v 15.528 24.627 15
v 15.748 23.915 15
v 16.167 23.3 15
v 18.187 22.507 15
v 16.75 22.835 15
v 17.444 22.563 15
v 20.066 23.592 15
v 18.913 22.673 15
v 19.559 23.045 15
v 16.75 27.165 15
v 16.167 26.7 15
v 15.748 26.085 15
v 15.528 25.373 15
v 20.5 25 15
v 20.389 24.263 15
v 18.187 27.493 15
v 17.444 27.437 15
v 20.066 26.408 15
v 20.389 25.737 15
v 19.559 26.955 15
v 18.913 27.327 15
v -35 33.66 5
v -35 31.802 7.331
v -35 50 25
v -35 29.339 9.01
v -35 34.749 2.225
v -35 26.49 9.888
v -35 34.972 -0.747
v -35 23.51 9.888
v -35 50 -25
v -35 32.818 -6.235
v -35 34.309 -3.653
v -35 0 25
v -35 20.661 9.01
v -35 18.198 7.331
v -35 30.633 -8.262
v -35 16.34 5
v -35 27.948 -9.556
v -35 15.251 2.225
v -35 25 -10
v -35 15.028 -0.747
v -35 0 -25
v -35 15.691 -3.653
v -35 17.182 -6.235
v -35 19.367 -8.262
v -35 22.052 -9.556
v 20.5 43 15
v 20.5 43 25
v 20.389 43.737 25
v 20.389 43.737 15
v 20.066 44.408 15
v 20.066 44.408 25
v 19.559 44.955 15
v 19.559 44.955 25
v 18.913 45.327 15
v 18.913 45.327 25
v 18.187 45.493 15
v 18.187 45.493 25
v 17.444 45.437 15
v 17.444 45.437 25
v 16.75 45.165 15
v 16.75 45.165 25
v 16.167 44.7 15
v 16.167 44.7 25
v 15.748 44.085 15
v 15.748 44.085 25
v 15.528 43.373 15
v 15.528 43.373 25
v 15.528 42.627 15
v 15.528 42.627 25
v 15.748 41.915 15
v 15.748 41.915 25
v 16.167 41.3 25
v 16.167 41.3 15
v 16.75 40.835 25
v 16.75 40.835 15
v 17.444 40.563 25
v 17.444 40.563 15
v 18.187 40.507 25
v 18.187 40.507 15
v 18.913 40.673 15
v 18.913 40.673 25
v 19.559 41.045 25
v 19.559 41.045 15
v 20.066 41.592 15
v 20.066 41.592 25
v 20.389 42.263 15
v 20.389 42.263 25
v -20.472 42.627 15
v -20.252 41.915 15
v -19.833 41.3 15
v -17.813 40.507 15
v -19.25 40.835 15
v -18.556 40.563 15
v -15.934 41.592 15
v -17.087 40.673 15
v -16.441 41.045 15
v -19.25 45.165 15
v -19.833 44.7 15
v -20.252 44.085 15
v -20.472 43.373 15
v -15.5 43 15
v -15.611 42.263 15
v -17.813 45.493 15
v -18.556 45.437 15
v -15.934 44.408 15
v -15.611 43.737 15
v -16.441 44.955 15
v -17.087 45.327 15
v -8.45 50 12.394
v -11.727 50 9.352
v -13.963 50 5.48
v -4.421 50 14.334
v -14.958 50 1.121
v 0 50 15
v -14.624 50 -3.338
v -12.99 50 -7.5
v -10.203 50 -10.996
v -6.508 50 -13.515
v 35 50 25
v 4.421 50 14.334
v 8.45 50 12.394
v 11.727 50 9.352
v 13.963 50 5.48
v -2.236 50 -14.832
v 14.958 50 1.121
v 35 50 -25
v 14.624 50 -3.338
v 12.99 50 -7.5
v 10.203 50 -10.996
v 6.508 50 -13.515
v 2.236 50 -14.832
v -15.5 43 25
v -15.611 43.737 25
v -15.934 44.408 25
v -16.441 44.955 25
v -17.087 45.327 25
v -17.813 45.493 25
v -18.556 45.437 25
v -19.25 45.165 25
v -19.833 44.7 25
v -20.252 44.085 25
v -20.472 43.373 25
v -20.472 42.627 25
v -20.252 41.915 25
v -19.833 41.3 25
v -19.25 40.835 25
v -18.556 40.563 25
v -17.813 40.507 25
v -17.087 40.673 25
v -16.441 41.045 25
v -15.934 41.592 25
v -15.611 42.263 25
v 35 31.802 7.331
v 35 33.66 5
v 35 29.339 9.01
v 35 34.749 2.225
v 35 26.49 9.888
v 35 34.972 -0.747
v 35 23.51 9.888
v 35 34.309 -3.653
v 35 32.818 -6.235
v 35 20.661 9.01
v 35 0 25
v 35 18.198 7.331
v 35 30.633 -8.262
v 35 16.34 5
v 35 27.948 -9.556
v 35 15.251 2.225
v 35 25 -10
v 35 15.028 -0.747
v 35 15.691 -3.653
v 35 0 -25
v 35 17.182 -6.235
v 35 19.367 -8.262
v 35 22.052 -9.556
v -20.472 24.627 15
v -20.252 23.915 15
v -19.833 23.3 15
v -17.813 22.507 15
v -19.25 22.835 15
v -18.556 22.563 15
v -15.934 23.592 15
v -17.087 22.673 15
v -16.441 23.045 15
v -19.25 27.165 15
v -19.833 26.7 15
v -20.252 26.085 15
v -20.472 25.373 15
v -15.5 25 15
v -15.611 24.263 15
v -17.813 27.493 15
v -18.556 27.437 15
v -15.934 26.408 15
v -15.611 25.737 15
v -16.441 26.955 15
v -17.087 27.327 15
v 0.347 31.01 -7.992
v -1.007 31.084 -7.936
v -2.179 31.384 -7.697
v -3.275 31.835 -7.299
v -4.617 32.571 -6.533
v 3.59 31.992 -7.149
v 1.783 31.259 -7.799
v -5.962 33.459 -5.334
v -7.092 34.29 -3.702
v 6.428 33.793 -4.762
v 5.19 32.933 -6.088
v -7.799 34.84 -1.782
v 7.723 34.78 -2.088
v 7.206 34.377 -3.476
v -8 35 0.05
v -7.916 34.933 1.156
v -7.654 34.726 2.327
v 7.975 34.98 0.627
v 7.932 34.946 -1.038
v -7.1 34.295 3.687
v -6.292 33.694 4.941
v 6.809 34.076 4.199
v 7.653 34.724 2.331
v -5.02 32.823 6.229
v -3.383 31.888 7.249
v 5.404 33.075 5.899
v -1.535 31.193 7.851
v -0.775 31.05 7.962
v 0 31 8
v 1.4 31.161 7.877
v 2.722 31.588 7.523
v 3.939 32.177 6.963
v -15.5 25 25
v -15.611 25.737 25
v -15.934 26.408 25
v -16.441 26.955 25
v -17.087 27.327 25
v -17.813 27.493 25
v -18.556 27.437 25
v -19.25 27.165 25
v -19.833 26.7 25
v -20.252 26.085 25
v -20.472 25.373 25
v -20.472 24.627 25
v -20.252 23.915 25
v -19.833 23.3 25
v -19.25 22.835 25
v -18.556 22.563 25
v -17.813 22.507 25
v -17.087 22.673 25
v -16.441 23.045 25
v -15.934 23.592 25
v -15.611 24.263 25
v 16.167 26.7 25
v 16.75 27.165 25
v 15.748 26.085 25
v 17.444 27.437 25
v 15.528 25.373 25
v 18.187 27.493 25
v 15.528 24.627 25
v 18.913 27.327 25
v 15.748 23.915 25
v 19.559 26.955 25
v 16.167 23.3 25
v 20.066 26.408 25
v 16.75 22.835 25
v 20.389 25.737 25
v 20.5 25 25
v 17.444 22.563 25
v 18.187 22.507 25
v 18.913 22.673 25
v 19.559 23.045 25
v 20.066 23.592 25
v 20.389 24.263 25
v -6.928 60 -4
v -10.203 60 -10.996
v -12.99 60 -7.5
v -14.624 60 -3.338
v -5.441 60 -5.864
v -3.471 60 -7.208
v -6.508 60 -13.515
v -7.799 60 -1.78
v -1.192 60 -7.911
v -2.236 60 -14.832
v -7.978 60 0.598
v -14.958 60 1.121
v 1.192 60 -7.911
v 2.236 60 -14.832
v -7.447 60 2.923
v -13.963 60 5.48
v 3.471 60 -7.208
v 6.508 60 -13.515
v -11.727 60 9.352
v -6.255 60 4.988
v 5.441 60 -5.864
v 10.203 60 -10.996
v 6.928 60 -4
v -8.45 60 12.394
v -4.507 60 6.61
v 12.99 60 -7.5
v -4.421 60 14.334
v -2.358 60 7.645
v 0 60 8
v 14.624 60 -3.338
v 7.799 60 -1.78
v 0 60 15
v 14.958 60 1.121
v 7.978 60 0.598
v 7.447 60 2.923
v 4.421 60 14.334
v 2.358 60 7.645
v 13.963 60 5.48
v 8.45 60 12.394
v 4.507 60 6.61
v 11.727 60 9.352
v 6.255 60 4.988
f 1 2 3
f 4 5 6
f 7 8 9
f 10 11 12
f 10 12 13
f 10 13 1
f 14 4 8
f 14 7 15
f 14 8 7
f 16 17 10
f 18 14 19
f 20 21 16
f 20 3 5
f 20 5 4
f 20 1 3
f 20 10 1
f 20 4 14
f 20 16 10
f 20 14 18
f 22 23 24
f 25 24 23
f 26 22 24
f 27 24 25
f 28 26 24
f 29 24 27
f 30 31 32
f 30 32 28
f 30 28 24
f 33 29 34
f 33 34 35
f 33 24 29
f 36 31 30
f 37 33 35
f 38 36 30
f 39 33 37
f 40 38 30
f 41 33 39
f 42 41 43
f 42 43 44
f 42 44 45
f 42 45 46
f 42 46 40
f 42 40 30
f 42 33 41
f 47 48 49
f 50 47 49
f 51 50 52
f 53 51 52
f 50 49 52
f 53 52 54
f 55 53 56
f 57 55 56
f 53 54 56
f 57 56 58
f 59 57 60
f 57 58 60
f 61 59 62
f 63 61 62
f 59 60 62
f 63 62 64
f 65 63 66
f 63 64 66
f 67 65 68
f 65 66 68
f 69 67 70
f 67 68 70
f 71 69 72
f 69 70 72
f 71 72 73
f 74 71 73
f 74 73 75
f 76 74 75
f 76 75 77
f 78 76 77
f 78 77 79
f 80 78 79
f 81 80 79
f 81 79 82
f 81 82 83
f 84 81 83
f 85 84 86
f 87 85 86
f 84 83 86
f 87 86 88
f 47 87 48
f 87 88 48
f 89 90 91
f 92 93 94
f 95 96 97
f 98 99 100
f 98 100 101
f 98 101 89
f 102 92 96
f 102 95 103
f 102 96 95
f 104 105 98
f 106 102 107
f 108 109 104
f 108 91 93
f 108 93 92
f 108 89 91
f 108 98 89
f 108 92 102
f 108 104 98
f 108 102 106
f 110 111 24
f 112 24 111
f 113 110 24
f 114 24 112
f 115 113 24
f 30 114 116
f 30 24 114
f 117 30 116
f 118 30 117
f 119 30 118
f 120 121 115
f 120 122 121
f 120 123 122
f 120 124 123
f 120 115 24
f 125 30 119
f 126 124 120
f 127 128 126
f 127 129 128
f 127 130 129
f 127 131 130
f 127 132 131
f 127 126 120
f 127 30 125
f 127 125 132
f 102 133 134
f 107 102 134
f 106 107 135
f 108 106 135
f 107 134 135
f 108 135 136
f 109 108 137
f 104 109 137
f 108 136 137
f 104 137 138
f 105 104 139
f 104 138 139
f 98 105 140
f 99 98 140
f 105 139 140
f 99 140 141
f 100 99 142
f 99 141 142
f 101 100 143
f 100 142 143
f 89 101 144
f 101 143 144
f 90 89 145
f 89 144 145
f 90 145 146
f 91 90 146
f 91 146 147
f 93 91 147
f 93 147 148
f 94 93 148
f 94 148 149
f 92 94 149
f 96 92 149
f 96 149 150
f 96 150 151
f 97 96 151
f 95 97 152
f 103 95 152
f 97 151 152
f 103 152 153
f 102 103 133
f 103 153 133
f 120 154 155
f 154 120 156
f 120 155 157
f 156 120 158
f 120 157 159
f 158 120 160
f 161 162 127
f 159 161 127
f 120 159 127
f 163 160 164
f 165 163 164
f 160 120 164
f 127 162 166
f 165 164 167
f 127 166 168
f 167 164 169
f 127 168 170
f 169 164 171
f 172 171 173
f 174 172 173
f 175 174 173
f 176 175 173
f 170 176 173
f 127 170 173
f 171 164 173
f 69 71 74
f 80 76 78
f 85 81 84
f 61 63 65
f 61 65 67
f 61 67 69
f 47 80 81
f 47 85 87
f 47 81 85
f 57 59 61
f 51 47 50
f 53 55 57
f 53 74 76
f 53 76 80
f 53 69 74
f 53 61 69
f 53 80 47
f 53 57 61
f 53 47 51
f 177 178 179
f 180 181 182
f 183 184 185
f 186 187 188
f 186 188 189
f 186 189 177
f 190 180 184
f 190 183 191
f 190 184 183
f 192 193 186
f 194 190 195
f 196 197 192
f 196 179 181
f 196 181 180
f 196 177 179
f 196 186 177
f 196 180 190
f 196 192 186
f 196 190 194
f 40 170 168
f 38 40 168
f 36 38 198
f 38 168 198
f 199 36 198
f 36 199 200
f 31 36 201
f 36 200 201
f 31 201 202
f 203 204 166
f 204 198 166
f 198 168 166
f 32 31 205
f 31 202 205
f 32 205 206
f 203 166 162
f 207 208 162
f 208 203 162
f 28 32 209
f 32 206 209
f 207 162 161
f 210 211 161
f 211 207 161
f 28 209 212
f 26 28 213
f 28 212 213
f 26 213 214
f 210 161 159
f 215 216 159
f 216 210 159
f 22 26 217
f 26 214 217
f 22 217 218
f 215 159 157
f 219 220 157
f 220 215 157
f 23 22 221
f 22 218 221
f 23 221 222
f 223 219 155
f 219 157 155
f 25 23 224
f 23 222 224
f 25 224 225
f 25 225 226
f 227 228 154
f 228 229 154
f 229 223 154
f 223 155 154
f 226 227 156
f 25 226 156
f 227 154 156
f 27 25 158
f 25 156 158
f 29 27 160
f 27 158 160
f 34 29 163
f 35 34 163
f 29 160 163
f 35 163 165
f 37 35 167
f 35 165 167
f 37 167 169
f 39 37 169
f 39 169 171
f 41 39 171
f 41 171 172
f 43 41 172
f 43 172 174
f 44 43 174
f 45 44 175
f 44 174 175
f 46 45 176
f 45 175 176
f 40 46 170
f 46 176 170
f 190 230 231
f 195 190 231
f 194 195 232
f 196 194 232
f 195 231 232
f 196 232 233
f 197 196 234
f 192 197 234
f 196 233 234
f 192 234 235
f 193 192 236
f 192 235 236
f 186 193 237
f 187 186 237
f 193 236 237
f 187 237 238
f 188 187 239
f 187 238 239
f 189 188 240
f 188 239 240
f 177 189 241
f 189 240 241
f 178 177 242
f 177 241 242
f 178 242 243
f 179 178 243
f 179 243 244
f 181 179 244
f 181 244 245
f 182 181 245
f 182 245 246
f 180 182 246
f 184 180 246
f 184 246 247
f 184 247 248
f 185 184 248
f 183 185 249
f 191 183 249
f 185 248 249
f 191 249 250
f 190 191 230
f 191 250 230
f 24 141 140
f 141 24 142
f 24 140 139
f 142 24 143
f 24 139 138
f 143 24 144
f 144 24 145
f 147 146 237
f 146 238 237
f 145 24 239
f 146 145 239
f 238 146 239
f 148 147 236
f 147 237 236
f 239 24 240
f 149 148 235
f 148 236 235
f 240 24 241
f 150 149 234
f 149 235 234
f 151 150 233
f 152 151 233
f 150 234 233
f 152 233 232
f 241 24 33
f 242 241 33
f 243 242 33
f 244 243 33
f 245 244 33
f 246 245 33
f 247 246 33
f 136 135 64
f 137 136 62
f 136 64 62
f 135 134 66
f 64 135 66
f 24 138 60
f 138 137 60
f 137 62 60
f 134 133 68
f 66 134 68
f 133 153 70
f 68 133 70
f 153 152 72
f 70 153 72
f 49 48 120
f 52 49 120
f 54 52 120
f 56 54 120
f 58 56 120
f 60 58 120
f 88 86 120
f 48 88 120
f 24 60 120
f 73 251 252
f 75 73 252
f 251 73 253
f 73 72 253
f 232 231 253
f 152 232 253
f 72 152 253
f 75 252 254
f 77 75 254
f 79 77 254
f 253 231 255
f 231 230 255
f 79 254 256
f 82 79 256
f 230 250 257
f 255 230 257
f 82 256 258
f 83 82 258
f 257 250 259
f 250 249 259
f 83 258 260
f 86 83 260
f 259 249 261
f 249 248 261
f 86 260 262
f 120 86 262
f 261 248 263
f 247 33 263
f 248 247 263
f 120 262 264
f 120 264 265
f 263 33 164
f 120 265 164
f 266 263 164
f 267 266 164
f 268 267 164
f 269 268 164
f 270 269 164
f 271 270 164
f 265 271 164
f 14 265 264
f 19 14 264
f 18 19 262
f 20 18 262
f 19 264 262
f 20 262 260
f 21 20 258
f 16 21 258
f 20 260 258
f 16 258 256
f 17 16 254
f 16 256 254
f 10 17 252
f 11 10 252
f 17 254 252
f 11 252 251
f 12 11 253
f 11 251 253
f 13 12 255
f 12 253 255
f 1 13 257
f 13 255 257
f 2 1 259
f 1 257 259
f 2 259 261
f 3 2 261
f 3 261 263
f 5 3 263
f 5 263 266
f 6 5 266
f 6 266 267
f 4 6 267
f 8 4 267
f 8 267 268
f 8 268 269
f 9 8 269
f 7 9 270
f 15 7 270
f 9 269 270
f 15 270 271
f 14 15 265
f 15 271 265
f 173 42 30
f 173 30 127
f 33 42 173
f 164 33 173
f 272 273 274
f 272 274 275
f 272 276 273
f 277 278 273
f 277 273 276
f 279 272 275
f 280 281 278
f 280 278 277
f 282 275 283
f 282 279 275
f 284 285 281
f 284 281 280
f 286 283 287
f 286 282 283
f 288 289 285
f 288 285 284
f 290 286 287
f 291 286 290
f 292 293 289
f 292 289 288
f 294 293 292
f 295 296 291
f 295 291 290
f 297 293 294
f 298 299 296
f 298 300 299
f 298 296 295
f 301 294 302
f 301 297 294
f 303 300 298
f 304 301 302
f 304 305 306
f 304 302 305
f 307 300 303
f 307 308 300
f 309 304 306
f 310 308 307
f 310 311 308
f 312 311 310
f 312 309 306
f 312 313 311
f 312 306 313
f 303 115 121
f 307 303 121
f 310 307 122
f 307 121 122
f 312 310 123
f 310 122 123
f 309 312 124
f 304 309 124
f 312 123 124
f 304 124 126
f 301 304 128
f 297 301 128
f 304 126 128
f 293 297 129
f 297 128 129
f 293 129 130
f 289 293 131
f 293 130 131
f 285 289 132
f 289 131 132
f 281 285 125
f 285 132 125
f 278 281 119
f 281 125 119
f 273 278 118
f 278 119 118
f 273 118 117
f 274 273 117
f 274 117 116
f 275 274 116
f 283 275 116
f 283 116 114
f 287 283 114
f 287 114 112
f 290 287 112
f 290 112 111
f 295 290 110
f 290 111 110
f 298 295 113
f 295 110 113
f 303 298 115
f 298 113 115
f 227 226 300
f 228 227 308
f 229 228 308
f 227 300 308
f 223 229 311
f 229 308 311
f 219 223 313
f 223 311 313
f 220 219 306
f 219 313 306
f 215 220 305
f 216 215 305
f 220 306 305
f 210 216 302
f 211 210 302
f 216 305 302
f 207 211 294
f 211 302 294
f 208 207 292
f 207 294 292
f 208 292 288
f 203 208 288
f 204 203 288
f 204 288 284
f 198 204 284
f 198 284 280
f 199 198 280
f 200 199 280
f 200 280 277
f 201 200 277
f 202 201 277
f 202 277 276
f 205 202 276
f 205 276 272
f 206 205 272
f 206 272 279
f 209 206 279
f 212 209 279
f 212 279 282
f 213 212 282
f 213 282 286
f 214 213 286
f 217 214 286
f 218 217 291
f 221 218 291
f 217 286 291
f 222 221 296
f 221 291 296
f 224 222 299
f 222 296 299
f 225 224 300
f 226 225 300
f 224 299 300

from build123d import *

# Parameters (mm, degrees)
SKETCH_1_W          = 70
SKETCH_1_H          = 50
EXTRUDE_1_DEPTH     = 50
SKETCH_2_R          = 15
EXTRUDE_2_DEPTH     = 10
SKETCH_3_R          = 10
CUT_EXTRUDE_1_DEPTH = 71
SKETCH_4_R          = 8
CUT_EXTRUDE_2_DEPTH = 35
SKETCH_5_R          = 2.5
CUT_EXTRUDE_3_DEPTH = 10


with BuildPart() as part:
    # 草图1 → 凸台-拉伸1 (new body)
    with BuildSketch(Plane(origin=(0, 0, 0), x_dir=(1, 0, 0), z_dir=(0, 1, 0))):
        Rectangle(SKETCH_1_W, SKETCH_1_H)
    extrude(amount=EXTRUDE_1_DEPTH)

    # 草图2 → 凸台-拉伸2 (add)
    with BuildSketch(Plane(origin=(0, 50, 0), x_dir=(1, 0, 0), z_dir=(0, 1, 0))):
        with Locations(Location((0, 0, 0), (0, 0, 270))):
            Circle(SKETCH_2_R)
    extrude(amount=EXTRUDE_2_DEPTH)

    # 草图3 → 切除-拉伸1 (cut, symmetric)
    with BuildSketch(Plane(origin=(0, 0, 0), x_dir=(0, 0, -1), z_dir=(1, 0, 0))):
        with Locations((0, 25)):
            Circle(SKETCH_3_R)
    extrude(amount=CUT_EXTRUDE_1_DEPTH, both=True, mode=Mode.SUBTRACT)

    # 草图4 → 切除-拉伸2 (cut)
    with BuildSketch(Plane(origin=(0, 60, 0), x_dir=(1, 0, 0), z_dir=(0, 1, 0))):
        with Locations(Location((0, 0, 0), (0, 0, 270))):
            Circle(SKETCH_4_R)
    extrude(amount=-CUT_EXTRUDE_2_DEPTH, mode=Mode.SUBTRACT)

    # 草图5 → 切除-拉伸3 (cut)
    with BuildSketch(Plane.XY.offset(25)):
        with Locations((-18, 25)):
            Circle(SKETCH_5_R)
        with Locations((18, 25)):
            Circle(SKETCH_5_R)
        with Locations((-18, 43)):
            Circle(SKETCH_5_R)
        with Locations((18, 43)):
            Circle(SKETCH_5_R)
    extrude(amount=-CUT_EXTRUDE_3_DEPTH, mode=Mode.SUBTRACT)


solid = part.part
